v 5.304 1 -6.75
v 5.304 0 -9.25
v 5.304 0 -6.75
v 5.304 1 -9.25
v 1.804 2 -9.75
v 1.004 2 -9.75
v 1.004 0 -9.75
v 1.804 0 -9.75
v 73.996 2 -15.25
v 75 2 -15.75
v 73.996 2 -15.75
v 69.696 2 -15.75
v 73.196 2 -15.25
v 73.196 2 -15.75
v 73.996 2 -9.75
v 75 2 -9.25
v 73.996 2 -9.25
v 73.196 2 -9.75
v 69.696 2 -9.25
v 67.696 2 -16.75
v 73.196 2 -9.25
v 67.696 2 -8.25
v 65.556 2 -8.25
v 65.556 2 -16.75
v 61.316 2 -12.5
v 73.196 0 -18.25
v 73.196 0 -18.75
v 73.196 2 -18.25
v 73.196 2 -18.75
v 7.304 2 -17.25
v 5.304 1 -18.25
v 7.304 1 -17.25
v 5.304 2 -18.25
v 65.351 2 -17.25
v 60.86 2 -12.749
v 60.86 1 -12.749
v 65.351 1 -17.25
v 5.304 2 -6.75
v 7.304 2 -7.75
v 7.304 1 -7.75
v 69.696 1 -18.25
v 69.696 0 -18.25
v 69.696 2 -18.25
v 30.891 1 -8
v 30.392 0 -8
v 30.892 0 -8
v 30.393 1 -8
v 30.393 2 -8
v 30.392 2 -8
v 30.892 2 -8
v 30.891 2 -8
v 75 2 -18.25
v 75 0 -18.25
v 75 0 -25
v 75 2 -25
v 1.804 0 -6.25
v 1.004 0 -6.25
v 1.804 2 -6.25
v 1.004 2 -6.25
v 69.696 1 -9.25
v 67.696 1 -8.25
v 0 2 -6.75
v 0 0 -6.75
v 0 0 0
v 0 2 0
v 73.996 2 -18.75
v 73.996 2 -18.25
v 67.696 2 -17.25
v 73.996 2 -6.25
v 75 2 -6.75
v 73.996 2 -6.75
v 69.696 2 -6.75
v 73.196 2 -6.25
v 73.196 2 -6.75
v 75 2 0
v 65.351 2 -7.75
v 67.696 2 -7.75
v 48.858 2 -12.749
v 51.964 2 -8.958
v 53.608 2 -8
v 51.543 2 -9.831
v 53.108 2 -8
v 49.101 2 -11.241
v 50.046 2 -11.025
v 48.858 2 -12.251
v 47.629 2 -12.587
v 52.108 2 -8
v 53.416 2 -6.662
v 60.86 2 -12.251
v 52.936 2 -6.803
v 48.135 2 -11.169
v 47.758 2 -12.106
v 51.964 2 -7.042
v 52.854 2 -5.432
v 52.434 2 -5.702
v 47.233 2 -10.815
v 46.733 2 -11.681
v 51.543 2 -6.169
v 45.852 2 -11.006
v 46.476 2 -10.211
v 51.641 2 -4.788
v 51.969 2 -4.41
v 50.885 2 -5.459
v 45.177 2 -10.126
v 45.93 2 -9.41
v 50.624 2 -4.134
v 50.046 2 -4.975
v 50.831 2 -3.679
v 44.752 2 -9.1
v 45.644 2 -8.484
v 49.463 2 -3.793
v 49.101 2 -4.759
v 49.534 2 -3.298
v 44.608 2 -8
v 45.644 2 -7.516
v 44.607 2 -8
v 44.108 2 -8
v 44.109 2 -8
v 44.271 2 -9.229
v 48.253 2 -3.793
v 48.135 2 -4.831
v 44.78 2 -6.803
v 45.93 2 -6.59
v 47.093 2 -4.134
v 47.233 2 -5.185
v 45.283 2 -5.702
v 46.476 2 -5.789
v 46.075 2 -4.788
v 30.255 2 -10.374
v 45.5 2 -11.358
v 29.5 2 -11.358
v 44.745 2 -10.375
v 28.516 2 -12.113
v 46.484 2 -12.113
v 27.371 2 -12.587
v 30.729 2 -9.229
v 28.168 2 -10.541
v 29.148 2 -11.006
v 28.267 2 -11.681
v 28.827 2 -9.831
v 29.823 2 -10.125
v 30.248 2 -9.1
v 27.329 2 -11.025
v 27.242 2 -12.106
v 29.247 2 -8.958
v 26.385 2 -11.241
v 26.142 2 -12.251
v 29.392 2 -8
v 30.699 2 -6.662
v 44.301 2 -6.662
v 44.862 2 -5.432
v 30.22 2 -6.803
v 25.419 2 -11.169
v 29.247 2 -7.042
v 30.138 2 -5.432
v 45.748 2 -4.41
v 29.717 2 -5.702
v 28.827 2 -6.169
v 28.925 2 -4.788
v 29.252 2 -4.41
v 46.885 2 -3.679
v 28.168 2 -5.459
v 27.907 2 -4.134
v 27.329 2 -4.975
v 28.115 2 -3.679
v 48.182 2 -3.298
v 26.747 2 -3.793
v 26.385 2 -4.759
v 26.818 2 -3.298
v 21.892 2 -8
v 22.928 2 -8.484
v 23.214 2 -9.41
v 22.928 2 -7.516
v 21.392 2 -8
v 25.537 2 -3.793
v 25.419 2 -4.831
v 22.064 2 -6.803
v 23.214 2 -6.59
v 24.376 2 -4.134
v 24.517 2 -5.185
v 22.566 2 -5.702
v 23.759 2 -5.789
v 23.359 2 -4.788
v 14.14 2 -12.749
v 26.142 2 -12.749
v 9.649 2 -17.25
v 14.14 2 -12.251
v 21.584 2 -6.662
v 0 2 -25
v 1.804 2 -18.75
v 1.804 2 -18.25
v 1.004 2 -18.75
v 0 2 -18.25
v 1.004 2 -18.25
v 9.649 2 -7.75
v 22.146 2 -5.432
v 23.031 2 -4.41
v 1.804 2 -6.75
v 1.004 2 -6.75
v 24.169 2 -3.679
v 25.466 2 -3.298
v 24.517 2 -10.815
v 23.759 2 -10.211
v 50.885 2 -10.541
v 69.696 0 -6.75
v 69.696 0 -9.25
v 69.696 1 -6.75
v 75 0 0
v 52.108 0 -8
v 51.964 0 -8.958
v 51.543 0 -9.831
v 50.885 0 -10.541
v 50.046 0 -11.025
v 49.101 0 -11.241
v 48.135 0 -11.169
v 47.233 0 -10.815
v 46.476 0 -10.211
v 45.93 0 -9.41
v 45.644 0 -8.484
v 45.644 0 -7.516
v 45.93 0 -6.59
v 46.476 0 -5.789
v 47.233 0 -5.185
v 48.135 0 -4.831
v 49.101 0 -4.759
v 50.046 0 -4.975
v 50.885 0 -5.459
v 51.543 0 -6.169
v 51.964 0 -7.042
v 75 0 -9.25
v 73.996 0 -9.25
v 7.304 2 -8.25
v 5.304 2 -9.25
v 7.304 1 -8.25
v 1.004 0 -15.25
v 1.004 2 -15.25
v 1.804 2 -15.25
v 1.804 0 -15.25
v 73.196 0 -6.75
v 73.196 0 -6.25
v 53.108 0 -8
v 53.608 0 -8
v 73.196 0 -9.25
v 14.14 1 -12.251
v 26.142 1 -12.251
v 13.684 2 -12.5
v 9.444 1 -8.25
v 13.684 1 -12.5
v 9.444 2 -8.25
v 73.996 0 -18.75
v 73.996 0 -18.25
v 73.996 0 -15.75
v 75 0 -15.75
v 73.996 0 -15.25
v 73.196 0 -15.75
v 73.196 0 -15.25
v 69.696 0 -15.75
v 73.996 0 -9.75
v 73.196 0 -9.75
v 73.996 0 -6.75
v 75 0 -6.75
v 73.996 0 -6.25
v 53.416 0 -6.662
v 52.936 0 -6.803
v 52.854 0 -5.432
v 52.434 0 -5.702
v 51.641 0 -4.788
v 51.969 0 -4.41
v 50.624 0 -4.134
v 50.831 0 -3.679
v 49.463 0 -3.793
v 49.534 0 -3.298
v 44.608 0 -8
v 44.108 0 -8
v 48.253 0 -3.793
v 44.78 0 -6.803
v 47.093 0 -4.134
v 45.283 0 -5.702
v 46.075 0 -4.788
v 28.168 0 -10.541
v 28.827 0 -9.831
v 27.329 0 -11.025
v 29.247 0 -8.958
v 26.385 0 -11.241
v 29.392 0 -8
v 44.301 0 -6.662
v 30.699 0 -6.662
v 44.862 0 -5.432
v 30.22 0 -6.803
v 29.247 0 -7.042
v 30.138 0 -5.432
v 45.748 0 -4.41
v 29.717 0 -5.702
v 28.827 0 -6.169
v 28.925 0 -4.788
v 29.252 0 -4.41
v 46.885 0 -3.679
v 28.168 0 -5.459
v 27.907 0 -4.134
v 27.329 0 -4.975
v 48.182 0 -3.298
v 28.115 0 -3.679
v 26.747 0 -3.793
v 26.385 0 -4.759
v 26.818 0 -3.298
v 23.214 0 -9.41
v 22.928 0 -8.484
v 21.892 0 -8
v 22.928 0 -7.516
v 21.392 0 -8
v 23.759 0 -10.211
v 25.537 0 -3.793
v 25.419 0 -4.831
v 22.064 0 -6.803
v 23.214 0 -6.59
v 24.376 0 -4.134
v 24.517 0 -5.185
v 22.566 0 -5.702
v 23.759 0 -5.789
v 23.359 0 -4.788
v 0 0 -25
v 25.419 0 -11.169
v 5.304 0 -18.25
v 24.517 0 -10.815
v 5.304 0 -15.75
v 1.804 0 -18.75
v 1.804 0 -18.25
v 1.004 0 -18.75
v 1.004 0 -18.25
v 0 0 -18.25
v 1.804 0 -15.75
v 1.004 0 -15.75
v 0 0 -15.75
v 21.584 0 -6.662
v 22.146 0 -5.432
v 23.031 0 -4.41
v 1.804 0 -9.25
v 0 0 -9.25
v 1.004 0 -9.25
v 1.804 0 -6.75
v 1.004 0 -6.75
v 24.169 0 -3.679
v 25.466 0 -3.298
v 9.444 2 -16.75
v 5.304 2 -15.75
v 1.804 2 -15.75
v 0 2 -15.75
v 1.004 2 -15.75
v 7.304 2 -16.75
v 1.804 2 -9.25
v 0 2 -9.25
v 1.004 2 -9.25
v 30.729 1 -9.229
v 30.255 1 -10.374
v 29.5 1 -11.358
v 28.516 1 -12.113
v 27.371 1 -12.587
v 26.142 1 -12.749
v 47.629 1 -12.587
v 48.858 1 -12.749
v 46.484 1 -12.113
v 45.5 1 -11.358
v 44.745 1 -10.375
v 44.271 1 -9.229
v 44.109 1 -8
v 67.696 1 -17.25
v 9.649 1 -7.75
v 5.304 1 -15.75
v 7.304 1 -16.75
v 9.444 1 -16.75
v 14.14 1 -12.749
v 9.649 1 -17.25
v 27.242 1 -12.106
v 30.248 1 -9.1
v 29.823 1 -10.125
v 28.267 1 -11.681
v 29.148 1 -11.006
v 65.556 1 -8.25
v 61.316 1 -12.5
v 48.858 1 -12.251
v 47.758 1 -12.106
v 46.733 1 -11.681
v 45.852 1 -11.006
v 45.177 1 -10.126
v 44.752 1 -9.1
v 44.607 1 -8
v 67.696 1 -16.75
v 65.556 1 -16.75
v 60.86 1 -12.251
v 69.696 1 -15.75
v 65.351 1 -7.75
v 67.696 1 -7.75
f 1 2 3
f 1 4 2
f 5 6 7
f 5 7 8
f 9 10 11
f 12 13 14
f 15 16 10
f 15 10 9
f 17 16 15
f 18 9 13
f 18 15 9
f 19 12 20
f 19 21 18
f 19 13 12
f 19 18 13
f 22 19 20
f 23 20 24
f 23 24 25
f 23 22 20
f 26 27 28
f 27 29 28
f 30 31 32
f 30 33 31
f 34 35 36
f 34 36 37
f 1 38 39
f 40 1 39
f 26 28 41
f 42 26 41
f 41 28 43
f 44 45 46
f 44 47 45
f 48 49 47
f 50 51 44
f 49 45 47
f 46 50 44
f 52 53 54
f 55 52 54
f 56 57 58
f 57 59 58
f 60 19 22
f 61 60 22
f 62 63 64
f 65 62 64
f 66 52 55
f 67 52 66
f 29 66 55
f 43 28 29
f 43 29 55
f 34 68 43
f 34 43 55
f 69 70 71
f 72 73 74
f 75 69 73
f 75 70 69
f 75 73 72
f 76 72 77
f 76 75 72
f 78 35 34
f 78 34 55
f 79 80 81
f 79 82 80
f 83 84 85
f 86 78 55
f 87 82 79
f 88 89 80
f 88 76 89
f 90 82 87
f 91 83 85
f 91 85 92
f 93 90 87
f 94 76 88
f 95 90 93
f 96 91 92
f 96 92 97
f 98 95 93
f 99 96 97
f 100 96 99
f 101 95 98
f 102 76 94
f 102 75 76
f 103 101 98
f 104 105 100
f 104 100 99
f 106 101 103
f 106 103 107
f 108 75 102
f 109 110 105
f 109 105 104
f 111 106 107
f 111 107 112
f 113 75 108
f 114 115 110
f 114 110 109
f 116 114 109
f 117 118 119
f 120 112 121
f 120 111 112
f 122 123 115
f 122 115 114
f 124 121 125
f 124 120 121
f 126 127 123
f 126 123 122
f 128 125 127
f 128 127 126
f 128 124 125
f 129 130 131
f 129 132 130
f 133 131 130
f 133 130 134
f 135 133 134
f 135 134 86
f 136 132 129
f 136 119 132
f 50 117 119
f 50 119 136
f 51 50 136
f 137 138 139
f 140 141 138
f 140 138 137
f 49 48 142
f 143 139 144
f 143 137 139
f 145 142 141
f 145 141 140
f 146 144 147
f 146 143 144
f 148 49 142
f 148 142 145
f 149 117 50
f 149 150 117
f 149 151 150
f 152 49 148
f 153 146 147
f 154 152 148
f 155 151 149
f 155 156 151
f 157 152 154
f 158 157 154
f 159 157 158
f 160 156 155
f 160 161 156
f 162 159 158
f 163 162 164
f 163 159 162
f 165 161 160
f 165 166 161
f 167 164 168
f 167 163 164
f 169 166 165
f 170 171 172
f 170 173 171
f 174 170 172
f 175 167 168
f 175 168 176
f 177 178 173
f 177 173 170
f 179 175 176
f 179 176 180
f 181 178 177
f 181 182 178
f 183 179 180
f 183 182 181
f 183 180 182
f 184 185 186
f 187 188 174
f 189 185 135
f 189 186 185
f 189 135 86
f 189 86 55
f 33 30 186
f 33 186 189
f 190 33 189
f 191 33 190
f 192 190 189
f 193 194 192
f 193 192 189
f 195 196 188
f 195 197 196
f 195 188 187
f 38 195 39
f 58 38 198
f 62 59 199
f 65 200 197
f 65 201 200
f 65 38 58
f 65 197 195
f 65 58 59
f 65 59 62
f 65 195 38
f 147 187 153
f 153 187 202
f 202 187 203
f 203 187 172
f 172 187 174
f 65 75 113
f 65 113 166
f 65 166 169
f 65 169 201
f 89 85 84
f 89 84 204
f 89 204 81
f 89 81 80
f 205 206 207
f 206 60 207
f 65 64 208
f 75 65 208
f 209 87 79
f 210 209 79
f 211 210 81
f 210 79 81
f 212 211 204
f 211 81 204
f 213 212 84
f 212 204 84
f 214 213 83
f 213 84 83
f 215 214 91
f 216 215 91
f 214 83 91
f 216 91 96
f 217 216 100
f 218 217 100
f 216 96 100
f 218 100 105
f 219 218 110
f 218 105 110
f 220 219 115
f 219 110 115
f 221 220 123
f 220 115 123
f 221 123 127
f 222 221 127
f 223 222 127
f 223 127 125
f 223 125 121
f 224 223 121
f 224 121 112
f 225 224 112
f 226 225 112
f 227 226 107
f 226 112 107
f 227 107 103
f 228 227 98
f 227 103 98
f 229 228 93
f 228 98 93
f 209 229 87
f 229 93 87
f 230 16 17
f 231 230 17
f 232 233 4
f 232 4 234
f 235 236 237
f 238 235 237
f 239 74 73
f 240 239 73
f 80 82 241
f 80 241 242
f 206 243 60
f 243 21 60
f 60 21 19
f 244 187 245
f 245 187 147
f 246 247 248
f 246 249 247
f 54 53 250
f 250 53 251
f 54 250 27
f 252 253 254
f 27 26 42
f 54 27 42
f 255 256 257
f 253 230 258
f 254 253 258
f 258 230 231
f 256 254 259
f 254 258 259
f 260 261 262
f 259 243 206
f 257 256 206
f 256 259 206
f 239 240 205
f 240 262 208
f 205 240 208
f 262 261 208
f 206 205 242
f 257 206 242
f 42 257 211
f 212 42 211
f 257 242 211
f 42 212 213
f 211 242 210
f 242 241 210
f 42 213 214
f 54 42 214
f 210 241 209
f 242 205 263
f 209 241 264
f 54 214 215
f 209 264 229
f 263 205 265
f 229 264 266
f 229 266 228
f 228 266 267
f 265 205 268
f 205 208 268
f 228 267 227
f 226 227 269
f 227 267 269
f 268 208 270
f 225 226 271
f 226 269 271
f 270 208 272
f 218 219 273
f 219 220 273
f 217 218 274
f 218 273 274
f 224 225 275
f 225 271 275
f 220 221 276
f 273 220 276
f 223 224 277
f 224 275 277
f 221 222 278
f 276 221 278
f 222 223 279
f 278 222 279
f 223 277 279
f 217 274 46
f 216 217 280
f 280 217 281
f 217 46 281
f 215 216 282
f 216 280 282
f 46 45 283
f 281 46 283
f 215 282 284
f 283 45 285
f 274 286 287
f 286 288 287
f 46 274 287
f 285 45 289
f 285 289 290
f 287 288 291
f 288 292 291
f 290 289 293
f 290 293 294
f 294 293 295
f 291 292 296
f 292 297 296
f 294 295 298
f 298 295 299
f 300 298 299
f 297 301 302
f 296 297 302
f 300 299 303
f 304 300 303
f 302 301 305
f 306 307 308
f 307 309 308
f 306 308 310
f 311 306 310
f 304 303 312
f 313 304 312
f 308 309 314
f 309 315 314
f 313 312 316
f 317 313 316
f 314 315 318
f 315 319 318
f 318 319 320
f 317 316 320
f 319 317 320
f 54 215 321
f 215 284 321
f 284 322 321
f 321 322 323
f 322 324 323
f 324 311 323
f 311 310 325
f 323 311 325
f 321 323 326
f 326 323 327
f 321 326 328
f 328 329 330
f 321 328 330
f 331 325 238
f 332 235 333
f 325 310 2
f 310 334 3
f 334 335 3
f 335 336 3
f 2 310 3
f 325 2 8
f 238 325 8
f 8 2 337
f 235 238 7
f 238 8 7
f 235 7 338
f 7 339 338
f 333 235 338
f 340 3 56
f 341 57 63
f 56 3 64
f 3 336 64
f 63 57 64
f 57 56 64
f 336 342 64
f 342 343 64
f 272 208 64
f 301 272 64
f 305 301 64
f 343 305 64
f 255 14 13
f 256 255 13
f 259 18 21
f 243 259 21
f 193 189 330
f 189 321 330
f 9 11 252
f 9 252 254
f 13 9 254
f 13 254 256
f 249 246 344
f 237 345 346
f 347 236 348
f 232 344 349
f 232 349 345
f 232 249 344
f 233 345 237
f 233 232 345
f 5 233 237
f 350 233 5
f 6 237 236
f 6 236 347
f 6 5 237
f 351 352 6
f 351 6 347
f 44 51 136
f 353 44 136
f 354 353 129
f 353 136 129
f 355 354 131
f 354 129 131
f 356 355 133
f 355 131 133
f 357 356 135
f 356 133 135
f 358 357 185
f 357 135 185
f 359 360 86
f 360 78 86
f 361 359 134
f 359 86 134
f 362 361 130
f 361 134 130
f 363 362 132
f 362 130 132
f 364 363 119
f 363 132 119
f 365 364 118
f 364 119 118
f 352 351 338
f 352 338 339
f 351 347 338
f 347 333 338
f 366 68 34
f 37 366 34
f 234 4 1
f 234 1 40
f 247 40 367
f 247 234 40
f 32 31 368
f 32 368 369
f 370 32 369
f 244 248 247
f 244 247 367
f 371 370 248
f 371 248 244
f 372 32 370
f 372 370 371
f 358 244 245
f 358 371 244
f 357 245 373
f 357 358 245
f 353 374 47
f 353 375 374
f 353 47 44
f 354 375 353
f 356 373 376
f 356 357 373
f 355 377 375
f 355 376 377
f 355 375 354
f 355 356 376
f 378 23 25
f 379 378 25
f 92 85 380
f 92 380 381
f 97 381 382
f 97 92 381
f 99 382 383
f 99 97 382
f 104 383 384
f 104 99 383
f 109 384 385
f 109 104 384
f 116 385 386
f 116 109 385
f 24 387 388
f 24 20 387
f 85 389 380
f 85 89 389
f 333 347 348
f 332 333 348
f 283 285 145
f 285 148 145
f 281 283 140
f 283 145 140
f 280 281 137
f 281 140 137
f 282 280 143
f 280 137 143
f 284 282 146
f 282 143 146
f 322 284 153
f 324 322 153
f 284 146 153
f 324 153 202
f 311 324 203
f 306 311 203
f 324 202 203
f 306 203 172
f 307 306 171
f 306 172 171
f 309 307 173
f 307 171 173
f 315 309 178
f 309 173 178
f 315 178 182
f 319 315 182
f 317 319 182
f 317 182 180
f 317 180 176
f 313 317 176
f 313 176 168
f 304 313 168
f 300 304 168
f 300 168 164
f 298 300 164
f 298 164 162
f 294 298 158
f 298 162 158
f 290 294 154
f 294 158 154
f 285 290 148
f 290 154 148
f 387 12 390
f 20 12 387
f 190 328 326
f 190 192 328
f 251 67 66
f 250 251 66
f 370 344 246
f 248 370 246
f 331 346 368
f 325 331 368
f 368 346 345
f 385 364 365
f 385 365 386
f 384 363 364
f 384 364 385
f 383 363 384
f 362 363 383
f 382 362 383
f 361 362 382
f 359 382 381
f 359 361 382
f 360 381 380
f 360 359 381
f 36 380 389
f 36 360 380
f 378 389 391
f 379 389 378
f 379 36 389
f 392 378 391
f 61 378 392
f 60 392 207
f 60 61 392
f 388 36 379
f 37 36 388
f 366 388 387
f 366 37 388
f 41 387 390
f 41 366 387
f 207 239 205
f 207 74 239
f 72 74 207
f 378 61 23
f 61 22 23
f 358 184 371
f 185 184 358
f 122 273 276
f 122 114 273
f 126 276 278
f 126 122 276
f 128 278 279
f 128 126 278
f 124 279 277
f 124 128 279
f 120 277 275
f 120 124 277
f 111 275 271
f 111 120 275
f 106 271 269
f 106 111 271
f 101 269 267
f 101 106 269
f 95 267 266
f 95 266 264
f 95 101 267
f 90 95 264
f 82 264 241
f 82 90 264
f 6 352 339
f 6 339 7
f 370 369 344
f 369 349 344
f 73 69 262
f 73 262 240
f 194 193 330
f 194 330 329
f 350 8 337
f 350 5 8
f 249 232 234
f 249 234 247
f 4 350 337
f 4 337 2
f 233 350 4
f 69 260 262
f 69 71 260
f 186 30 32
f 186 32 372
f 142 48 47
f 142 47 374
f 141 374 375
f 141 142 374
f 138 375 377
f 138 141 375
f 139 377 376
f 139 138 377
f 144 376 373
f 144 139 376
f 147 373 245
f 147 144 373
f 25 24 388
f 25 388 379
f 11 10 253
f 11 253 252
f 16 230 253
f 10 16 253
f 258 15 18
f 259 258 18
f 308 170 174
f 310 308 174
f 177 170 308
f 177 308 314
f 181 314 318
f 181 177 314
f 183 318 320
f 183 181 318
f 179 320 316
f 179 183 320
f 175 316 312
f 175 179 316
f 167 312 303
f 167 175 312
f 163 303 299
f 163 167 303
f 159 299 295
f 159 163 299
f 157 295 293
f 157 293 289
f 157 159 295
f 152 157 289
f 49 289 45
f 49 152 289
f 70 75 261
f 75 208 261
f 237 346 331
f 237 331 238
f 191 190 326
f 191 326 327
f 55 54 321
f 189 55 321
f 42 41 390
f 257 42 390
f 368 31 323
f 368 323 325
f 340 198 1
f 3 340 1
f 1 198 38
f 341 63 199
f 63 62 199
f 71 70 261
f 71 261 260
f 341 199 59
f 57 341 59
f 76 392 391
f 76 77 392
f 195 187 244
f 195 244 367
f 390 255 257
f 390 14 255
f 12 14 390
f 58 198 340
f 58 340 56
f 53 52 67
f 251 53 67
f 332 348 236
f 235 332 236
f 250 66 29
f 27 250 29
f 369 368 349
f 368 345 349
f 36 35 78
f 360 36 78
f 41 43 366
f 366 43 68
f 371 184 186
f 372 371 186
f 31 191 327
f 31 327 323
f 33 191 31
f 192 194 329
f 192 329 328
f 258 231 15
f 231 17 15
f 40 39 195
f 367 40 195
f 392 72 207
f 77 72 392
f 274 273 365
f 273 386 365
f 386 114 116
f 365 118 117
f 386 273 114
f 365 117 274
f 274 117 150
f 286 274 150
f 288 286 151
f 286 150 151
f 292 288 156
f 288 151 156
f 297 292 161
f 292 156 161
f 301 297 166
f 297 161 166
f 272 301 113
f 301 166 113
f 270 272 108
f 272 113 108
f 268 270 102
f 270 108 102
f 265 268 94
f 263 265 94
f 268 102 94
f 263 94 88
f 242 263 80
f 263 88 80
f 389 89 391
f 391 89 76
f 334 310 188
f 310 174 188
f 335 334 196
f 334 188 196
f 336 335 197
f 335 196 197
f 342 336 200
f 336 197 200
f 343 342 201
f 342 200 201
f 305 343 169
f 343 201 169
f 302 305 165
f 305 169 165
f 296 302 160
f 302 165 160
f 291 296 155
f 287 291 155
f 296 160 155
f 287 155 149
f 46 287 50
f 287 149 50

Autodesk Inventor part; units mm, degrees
ref_plane "YZ Plane" through (0, 0, 0) normal (1, 0, 0) x (0, 1, 0)
ref_plane "XZ Plane" through (0, 0, 0) normal (0, 1, 0) x (-1, 0, 0)
ref_plane "XY Plane" through (0, 0, 0) normal (0, 0, 1) x (1, 0, 0)
sketch "Sombreado_1" plane through (0, 0, 0) normal (0, 0, 1) x (1, 0, 0)
  point P0 (0, 0)
sketch "Sombreado_2" plane through (0, 0, 0) normal (0, 0, 1) x (1, 0, 0)
  point P0 (0, 0)
sketch "Sombreado_3" plane through (0, 0, 0) normal (0, 0, 1) x (1, 0, 0)
  point P0 (0, 0)
sketch "Boceto1" plane through (0, 0, 0) normal (0, 1, 0) x (-1, 0, 0)
  line L0 (30.3882, 1.25) -> (30.8882, 1.25)
  line L1 (0, -6.75) -> (75, -6.75)
  line L2 (75, -6.75) -> (75, 18.25)
  line L3 (75, 18.25) -> (0, 18.25)
  line L4 (0, 18.25) -> (0, -6.75)
  arc A0 (21.3882, 1.25) -> (30.8882, 1.25) centre (26.1382, 1.25) ccw
  arc A1 (21.8882, 1.25) -> (30.3882, 1.25) centre (26.1382, 1.25) ccw
  line L5 (21.3882, 1.25) -> (21.8882, 1.25)
  line L6 (1.8, 2.5) -> (5.3, 2.5)
  line L7 (1.8, 2.5) -> (1.8, 3)
  line L8 (1.8, 3) -> (1, 3)
  line L9 (1, 3) -> (1, 2.5)
  line L10 (1, 0) -> (0, 0)
  line L11 (1, 0) -> (1, -0.5)
  line L12 (1, -0.5) -> (1.8, -0.5)
  line L13 (1.8, -0.5) -> (1.8, 0)
  line L14 (5.3, 0) -> (1.8, 0)
  line L15 (0, 2.5) -> (1, 2.5)
  line L16 (1.8, 11.5) -> (5.3, 11.5)
  line L17 (5.3, 9) -> (1.8, 9)
  line L18 (1, 9) -> (0, 9)
  line L19 (0, 11.5) -> (1, 11.5)
  line L20 (1.8, 11.5) -> (1.8, 12)
  line L21 (1.8, 12) -> (1, 12)
  line L22 (1, 12) -> (1, 11.5)
  line L23 (1, 9) -> (1, 8.5)
  line L24 (1, 8.5) -> (1.8, 8.5)
  line L25 (1.8, 8.5) -> (1.8, 9)
  line L26 (44.6082, 1.25) -> (44.1082, 1.25)
  arc A2 (44.1082, 1.25) -> (53.6082, 1.25) centre (48.8582, 1.25) ccw
  arc A3 (44.6082, 1.25) -> (53.1082, 1.25) centre (48.8582, 1.25) ccw
  line L27 (53.6082, 1.25) -> (53.1082, 1.25)
  line L28 (73.1964, 2.5) -> (69.6964, 2.5)
  line L29 (69.6964, 0) -> (73.1964, 0)
  line L30 (73.9964, 0) -> (74.9964, 0)
  line L31 (74.9964, 2.5) -> (73.9964, 2.5)
  line L32 (73.1964, 2.5) -> (73.1964, 3)
  line L33 (73.1964, 3) -> (73.9964, 3)
  line L34 (73.9964, 3) -> (73.9964, 2.5)
  line L35 (73.9964, 0) -> (73.9964, -0.5)
  line L36 (73.9964, -0.5) -> (73.1964, -0.5)
  line L37 (73.1964, -0.5) -> (73.1964, 0)
  line L38 (73.1964, 11.5) -> (69.6964, 11.5)
  line L39 (69.6964, 9) -> (73.1964, 9)
  line L40 (73.9964, 9) -> (74.9964, 9)
  line L41 (74.9964, 11.5) -> (73.9964, 11.5)
  line L42 (73.1964, 11.5) -> (73.1964, 12)
  line L43 (73.1964, 12) -> (73.9964, 12)
  line L44 (73.9964, 12) -> (73.9964, 11.5)
  line L45 (73.9964, 9) -> (73.9964, 8.5)
  line L46 (73.9964, 8.5) -> (73.1964, 8.5)
  line L47 (73.1964, 8.5) -> (73.1964, 9)
  line L48 (75, 18.25) -> (75, 43.25)
  line L49 (75, 43.25) -> (0, 43.25)
  line L50 (0, 43.25) -> (0, 18.25)
  line L51 (5.3, 11.5) -> (5.3, 9)
  line L52 (5.3, 2.5) -> (5.3, 0)
  line L53 (69.6964, 11.5) -> (69.6964, 9)
  line L54 (69.6964, 2.5) -> (69.6964, 0)
  circle A4 centre (26.1382, 1.25) radius 3.25
  circle A5 centre (48.8582, 1.25) radius 3.25
  circle A6 centre (26.1382, 26.25) radius 3.25
  circle A7 centre (48.8582, 26.25) radius 3.25
  line L55 (75, 43.25) -> (75, 68.25)
  line L56 (75, 68.25) -> (0, 68.25)
  line L57 (0, 68.25) -> (0, 43.25)
  circle A8 centre (26.1382, 51.25) radius 3.25
  circle A9 centre (48.8582, 51.25) radius 3.25
  point P0 (0, 0)
sketch "Boceto3" plane through (0, 0, 0) normal (0, 1, 0) x (-1, 0, 0)
  line L0 (0, 0) -> (-75, 0)
  line L1 (-75, 0) -> (-75, -25)
  line L2 (-75, -25) -> (0, -25)
  line L3 (0, -25) -> (0, 0)
  line L4 (0, 0) -> (-75, 0)
  line L5 (-75, 0) -> (-75, -25)
  line L6 (-75, -25) -> (0, -25)
  line L7 (0, -25) -> (0, 0)
  dimension "d4" = 75
  dimension "d5" = 25
  dimension "d6" = 75
  dimension "d7" = 25
extrude "Extrusión1" add sketch "Boceto3" along normal blind 2
sketch "Boceto4" plane through (0, 2, 0) normal (0, 1, 0) x (1, 0, 0)
  line L0 (-1.8065, 18.25) -> (1.0036, 18.25)
  line L1 (-1.8065, 15.75) -> (1.0036, 15.75)
  line L2 (1.0036, 15.75) -> (1.0036, 15.25)
  line L3 (1.8036, 15.75) -> (1.8036, 15.25)
  line L4 (1.0036, 18.75) -> (1.8036, 18.75)
  line L5 (1.0036, 15.25) -> (1.8036, 15.25)
  line L6 (1.0036, 18.25) -> (1.0036, 18.75)
  line L7 (1.8036, 18.75) -> (1.8036, 18.25)
  line L8 (1.8036, 18.25) -> (5.3036, 18.25)
  line L9 (1.8036, 15.75) -> (5.3036, 15.75)
  line L10 (5.3036, 18.25) -> (5.3036, 15.75)
  line L11 (-1.5403, 9.25) -> (-1.5403, 6.75)
  line L12 (-1.5403, 9.25) -> (1.0036, 9.25)
  line L13 (-1.5403, 6.75) -> (1.0036, 6.75)
  line L14 (1.0036, 6.75) -> (1.0036, 6.25)
  line L15 (1.8036, 6.75) -> (1.8036, 6.25)
  line L16 (1.0036, 9.75) -> (1.8036, 9.75)
  line L17 (1.0036, 6.25) -> (1.8036, 6.25)
  line L18 (1.0036, 9.25) -> (1.0036, 9.75)
  line L19 (1.8036, 9.75) -> (1.8036, 9.25)
  line L20 (1.8036, 9.25) -> (5.3036, 9.25)
  line L21 (1.8036, 6.75) -> (5.3036, 6.75)
  line L22 (5.3036, 9.25) -> (5.3036, 6.75)
  circle A0 centre (26.1418, 8) radius 3.25
  arc A1 (21.3918, 8) -> (30.8918, 8) centre (26.1418, 8) ccw
  arc A2 (21.8918, 8) -> (30.3918, 8) centre (26.1418, 8) ccw
  line L23 (30.3918, 8) -> (30.8918, 8)
  line L24 (21.8918, 8) -> (21.3918, 8)
  line L25 (-1.8065, 18.25) -> (-1.8065, 15.75)
  line L26 (5.3036, 15.75) -> (7.3036, 16.75)
  line L27 (5.3036, 18.25) -> (7.3036, 17.25)
  line L28 (7.3036, 16.75) -> (9.4436, 16.75)
  line L29 (9.4436, 16.75) -> (13.6836, 12.5)
  line L30 (9.7963, 17.1027) -> (9.7972, 17.1036)
  line L31 (14.1397, 12.749) -> (9.6494, 17.25)
  line L32 (7.3036, 17.25) -> (9.6494, 17.25)
  line L33 (5.3036, 9.25) -> (7.3036, 8.25)
  line L34 (5.3036, 6.75) -> (7.3036, 7.75)
  line L35 (7.3036, 8.25) -> (9.4436, 8.25)
  line L36 (9.4436, 8.25) -> (13.6836, 12.5)
  line L37 (14.1397, 12.251) -> (9.6494, 7.75)
  line L38 (7.3036, 7.75) -> (9.6494, 7.75)
  line L39 (14.1397, 12.749) -> (26.1418, 12.749)
  line L40 (14.1397, 12.251) -> (26.1418, 12.251)
  arc A3 (30.3918, 8) -> (26.1418, 12.25) centre (26.1418, 8) ccw
  arc A4 (30.8918, 8) -> (26.1418, 12.75) centre (26.1418, 8) ccw
  line L41 (0, 0) -> (75, 0) projected
  line L42 (75, 25) -> (0, 25) projected
  line L43 (76.8065, 18.25) -> (73.9964, 18.25)
  line L44 (76.8065, 15.75) -> (73.9964, 15.75)
  line L45 (73.9964, 15.75) -> (73.9964, 15.25)
  line L46 (73.1964, 15.75) -> (73.1964, 15.25)
  line L47 (73.9964, 18.75) -> (73.1964, 18.75)
  line L48 (73.9964, 15.25) -> (73.1964, 15.25)
  line L49 (73.9964, 18.25) -> (73.9964, 18.75)
  line L50 (73.1964, 18.75) -> (73.1964, 18.25)
  line L51 (73.1964, 18.25) -> (69.6964, 18.25)
  line L52 (73.1964, 15.75) -> (69.6964, 15.75)
  line L53 (69.6964, 18.25) -> (69.6964, 15.75)
  line L54 (69.6964, 9.25) -> (69.6964, 6.75)
  line L55 (73.1964, 6.75) -> (73.1964, 6.25)
  line L56 (73.1964, 6.75) -> (69.6964, 6.75)
  line L57 (73.1964, 9.75) -> (73.1964, 9.25)
  line L58 (73.9964, 6.75) -> (73.9964, 6.25)
  line L59 (73.9964, 6.25) -> (73.1964, 6.25)
  line L60 (73.9964, 9.75) -> (73.1964, 9.75)
  line L61 (73.9964, 9.25) -> (73.9964, 9.75)
  line L62 (76.5403, 9.25) -> (76.5403, 6.75)
  line L63 (76.5403, 9.25) -> (73.9964, 9.25)
  line L64 (76.5403, 6.75) -> (73.9964, 6.75)
  line L65 (73.1964, 9.25) -> (69.6964, 9.25)
  circle A5 centre (48.8582, 8) radius 3.25
  arc A6 (44.1082, 8) -> (53.6082, 8) centre (48.8582, 8) ccw
  arc A7 (44.6082, 8) -> (53.1082, 8) centre (48.8582, 8) ccw
  line L66 (44.6082, 8) -> (44.1082, 8)
  line L67 (53.1082, 8) -> (53.6082, 8)
  line L68 (76.8065, 18.25) -> (76.8065, 15.75)
  line L69 (69.6964, 15.75) -> (67.6964, 16.75)
  line L70 (69.6964, 18.25) -> (67.6964, 17.25)
  line L71 (67.6964, 16.75) -> (65.5564, 16.75)
  line L72 (65.5564, 16.75) -> (61.3164, 12.5)
  line L73 (65.2037, 17.1027) -> (65.2028, 17.1036)
  line L74 (60.8603, 12.749) -> (65.3506, 17.25)
  line L75 (67.6964, 17.25) -> (65.3506, 17.25)
  line L76 (67.6964, 8.25) -> (65.5564, 8.25)
  line L77 (67.6964, 7.75) -> (65.3506, 7.75)
  line L78 (60.8603, 12.251) -> (65.3506, 7.75)
  line L79 (65.5564, 8.25) -> (61.3164, 12.5)
  line L80 (69.6964, 9.25) -> (67.6964, 8.25)
  line L81 (69.6964, 6.75) -> (67.6964, 7.75)
  line L82 (60.8603, 12.749) -> (48.8582, 12.749)
  line L83 (60.8603, 12.251) -> (48.8582, 12.251)
  arc A8 (48.8582, 12.25) -> (44.6082, 8) centre (48.8582, 8) ccw
  arc A9 (48.8582, 12.75) -> (44.1082, 8) centre (48.8582, 8) ccw
extrude "Extrusión2" cut sketch "Boceto4" against normal blind 2 contours L0 L6 L4 L7 L8 L10 L9 L3 L5 L2 L1 L25 | A1 L24 A2 L23 | L22 L21 L15 L17 L14 L13 L11 L12 L18 L16 L19 L20 | A0 | L68 L44 L45 L48 L46 L52 L53 L51 L50 L47 L49 L43 | L66 A7 L67 A6 | L65 L57 L60 L61 L63 L62 L64 L58 L59 L55 L56 L54 | A5
sketch "Boceto5" plane through (0, 2, 0) normal (0, 1, 0) x (1, 0, 0)
  line L0 (5.3036, 18.25) -> (5.3036, 15.75)
  line L1 (5.3036, 9.25) -> (5.3036, 6.75)
  line L2 (5.3036, 15.75) -> (7.3036, 16.75)
  line L3 (5.3036, 18.25) -> (7.3036, 17.25)
  line L4 (7.3036, 16.75) -> (9.4436, 16.75)
  line L5 (9.4436, 16.75) -> (13.6836, 12.5)
  line L6 (9.7963, 17.1027) -> (9.7972, 17.1036)
  line L7 (14.1397, 12.749) -> (9.6494, 17.25)
  line L8 (7.3036, 17.25) -> (9.6494, 17.25)
  line L9 (7.3036, 8.25) -> (9.4436, 8.25)
  line L10 (7.3036, 7.75) -> (9.6494, 7.75)
  line L11 (14.1397, 12.251) -> (9.6494, 7.75)
  line L12 (9.4436, 8.25) -> (13.6836, 12.5)
  line L13 (5.3036, 9.25) -> (7.3036, 8.25)
  line L14 (5.3036, 6.75) -> (7.3036, 7.75)
  line L15 (14.1397, 12.749) -> (26.1418, 12.749)
  line L16 (14.1397, 12.251) -> (26.1418, 12.251)
  line L17 (30.8908, 8) -> (30.3928, 8)
  arc A0 (30.3928, 8) -> (26.1418, 12.251) centre (26.1418, 8) ccw
  arc A1 (30.8908, 8) -> (26.1418, 12.749) centre (26.1418, 8) ccw
  line L18 (69.6964, 18.25) -> (69.6964, 15.75)
  line L19 (69.6964, 9.25) -> (69.6964, 6.75)
  line L20 (69.6964, 15.75) -> (67.6964, 16.75)
  line L21 (69.6964, 18.25) -> (67.6964, 17.25)
  line L22 (67.6964, 16.75) -> (65.5564, 16.75)
  line L23 (65.5564, 16.75) -> (61.3164, 12.5)
  line L24 (65.2037, 17.1027) -> (65.2028, 17.1036)
  line L25 (60.8603, 12.749) -> (65.3506, 17.25)
  line L26 (67.6964, 17.25) -> (65.3506, 17.25)
  line L27 (67.6964, 8.25) -> (65.5564, 8.25)
  line L28 (67.6964, 7.75) -> (65.3506, 7.75)
  line L29 (60.8603, 12.251) -> (65.3506, 7.75)
  line L30 (65.5564, 8.25) -> (61.3164, 12.5)
  line L31 (69.6964, 9.25) -> (67.6964, 8.25)
  line L32 (69.6964, 6.75) -> (67.6964, 7.75)
  line L33 (60.8603, 12.749) -> (48.8582, 12.749)
  line L34 (60.8603, 12.251) -> (48.8582, 12.251)
  line L35 (44.1092, 8) -> (44.6072, 8)
  arc A2 (48.8582, 12.251) -> (44.6072, 8) centre (48.8582, 8) ccw
  arc A3 (48.8582, 12.749) -> (44.1092, 8) centre (48.8582, 8) ccw
  point P0 (0, 0)
extrude "Extrusión3" cut sketch "Boceto5" against normal blind 1
properties part number "2ureactor Torus" material "PPS Plastic"
